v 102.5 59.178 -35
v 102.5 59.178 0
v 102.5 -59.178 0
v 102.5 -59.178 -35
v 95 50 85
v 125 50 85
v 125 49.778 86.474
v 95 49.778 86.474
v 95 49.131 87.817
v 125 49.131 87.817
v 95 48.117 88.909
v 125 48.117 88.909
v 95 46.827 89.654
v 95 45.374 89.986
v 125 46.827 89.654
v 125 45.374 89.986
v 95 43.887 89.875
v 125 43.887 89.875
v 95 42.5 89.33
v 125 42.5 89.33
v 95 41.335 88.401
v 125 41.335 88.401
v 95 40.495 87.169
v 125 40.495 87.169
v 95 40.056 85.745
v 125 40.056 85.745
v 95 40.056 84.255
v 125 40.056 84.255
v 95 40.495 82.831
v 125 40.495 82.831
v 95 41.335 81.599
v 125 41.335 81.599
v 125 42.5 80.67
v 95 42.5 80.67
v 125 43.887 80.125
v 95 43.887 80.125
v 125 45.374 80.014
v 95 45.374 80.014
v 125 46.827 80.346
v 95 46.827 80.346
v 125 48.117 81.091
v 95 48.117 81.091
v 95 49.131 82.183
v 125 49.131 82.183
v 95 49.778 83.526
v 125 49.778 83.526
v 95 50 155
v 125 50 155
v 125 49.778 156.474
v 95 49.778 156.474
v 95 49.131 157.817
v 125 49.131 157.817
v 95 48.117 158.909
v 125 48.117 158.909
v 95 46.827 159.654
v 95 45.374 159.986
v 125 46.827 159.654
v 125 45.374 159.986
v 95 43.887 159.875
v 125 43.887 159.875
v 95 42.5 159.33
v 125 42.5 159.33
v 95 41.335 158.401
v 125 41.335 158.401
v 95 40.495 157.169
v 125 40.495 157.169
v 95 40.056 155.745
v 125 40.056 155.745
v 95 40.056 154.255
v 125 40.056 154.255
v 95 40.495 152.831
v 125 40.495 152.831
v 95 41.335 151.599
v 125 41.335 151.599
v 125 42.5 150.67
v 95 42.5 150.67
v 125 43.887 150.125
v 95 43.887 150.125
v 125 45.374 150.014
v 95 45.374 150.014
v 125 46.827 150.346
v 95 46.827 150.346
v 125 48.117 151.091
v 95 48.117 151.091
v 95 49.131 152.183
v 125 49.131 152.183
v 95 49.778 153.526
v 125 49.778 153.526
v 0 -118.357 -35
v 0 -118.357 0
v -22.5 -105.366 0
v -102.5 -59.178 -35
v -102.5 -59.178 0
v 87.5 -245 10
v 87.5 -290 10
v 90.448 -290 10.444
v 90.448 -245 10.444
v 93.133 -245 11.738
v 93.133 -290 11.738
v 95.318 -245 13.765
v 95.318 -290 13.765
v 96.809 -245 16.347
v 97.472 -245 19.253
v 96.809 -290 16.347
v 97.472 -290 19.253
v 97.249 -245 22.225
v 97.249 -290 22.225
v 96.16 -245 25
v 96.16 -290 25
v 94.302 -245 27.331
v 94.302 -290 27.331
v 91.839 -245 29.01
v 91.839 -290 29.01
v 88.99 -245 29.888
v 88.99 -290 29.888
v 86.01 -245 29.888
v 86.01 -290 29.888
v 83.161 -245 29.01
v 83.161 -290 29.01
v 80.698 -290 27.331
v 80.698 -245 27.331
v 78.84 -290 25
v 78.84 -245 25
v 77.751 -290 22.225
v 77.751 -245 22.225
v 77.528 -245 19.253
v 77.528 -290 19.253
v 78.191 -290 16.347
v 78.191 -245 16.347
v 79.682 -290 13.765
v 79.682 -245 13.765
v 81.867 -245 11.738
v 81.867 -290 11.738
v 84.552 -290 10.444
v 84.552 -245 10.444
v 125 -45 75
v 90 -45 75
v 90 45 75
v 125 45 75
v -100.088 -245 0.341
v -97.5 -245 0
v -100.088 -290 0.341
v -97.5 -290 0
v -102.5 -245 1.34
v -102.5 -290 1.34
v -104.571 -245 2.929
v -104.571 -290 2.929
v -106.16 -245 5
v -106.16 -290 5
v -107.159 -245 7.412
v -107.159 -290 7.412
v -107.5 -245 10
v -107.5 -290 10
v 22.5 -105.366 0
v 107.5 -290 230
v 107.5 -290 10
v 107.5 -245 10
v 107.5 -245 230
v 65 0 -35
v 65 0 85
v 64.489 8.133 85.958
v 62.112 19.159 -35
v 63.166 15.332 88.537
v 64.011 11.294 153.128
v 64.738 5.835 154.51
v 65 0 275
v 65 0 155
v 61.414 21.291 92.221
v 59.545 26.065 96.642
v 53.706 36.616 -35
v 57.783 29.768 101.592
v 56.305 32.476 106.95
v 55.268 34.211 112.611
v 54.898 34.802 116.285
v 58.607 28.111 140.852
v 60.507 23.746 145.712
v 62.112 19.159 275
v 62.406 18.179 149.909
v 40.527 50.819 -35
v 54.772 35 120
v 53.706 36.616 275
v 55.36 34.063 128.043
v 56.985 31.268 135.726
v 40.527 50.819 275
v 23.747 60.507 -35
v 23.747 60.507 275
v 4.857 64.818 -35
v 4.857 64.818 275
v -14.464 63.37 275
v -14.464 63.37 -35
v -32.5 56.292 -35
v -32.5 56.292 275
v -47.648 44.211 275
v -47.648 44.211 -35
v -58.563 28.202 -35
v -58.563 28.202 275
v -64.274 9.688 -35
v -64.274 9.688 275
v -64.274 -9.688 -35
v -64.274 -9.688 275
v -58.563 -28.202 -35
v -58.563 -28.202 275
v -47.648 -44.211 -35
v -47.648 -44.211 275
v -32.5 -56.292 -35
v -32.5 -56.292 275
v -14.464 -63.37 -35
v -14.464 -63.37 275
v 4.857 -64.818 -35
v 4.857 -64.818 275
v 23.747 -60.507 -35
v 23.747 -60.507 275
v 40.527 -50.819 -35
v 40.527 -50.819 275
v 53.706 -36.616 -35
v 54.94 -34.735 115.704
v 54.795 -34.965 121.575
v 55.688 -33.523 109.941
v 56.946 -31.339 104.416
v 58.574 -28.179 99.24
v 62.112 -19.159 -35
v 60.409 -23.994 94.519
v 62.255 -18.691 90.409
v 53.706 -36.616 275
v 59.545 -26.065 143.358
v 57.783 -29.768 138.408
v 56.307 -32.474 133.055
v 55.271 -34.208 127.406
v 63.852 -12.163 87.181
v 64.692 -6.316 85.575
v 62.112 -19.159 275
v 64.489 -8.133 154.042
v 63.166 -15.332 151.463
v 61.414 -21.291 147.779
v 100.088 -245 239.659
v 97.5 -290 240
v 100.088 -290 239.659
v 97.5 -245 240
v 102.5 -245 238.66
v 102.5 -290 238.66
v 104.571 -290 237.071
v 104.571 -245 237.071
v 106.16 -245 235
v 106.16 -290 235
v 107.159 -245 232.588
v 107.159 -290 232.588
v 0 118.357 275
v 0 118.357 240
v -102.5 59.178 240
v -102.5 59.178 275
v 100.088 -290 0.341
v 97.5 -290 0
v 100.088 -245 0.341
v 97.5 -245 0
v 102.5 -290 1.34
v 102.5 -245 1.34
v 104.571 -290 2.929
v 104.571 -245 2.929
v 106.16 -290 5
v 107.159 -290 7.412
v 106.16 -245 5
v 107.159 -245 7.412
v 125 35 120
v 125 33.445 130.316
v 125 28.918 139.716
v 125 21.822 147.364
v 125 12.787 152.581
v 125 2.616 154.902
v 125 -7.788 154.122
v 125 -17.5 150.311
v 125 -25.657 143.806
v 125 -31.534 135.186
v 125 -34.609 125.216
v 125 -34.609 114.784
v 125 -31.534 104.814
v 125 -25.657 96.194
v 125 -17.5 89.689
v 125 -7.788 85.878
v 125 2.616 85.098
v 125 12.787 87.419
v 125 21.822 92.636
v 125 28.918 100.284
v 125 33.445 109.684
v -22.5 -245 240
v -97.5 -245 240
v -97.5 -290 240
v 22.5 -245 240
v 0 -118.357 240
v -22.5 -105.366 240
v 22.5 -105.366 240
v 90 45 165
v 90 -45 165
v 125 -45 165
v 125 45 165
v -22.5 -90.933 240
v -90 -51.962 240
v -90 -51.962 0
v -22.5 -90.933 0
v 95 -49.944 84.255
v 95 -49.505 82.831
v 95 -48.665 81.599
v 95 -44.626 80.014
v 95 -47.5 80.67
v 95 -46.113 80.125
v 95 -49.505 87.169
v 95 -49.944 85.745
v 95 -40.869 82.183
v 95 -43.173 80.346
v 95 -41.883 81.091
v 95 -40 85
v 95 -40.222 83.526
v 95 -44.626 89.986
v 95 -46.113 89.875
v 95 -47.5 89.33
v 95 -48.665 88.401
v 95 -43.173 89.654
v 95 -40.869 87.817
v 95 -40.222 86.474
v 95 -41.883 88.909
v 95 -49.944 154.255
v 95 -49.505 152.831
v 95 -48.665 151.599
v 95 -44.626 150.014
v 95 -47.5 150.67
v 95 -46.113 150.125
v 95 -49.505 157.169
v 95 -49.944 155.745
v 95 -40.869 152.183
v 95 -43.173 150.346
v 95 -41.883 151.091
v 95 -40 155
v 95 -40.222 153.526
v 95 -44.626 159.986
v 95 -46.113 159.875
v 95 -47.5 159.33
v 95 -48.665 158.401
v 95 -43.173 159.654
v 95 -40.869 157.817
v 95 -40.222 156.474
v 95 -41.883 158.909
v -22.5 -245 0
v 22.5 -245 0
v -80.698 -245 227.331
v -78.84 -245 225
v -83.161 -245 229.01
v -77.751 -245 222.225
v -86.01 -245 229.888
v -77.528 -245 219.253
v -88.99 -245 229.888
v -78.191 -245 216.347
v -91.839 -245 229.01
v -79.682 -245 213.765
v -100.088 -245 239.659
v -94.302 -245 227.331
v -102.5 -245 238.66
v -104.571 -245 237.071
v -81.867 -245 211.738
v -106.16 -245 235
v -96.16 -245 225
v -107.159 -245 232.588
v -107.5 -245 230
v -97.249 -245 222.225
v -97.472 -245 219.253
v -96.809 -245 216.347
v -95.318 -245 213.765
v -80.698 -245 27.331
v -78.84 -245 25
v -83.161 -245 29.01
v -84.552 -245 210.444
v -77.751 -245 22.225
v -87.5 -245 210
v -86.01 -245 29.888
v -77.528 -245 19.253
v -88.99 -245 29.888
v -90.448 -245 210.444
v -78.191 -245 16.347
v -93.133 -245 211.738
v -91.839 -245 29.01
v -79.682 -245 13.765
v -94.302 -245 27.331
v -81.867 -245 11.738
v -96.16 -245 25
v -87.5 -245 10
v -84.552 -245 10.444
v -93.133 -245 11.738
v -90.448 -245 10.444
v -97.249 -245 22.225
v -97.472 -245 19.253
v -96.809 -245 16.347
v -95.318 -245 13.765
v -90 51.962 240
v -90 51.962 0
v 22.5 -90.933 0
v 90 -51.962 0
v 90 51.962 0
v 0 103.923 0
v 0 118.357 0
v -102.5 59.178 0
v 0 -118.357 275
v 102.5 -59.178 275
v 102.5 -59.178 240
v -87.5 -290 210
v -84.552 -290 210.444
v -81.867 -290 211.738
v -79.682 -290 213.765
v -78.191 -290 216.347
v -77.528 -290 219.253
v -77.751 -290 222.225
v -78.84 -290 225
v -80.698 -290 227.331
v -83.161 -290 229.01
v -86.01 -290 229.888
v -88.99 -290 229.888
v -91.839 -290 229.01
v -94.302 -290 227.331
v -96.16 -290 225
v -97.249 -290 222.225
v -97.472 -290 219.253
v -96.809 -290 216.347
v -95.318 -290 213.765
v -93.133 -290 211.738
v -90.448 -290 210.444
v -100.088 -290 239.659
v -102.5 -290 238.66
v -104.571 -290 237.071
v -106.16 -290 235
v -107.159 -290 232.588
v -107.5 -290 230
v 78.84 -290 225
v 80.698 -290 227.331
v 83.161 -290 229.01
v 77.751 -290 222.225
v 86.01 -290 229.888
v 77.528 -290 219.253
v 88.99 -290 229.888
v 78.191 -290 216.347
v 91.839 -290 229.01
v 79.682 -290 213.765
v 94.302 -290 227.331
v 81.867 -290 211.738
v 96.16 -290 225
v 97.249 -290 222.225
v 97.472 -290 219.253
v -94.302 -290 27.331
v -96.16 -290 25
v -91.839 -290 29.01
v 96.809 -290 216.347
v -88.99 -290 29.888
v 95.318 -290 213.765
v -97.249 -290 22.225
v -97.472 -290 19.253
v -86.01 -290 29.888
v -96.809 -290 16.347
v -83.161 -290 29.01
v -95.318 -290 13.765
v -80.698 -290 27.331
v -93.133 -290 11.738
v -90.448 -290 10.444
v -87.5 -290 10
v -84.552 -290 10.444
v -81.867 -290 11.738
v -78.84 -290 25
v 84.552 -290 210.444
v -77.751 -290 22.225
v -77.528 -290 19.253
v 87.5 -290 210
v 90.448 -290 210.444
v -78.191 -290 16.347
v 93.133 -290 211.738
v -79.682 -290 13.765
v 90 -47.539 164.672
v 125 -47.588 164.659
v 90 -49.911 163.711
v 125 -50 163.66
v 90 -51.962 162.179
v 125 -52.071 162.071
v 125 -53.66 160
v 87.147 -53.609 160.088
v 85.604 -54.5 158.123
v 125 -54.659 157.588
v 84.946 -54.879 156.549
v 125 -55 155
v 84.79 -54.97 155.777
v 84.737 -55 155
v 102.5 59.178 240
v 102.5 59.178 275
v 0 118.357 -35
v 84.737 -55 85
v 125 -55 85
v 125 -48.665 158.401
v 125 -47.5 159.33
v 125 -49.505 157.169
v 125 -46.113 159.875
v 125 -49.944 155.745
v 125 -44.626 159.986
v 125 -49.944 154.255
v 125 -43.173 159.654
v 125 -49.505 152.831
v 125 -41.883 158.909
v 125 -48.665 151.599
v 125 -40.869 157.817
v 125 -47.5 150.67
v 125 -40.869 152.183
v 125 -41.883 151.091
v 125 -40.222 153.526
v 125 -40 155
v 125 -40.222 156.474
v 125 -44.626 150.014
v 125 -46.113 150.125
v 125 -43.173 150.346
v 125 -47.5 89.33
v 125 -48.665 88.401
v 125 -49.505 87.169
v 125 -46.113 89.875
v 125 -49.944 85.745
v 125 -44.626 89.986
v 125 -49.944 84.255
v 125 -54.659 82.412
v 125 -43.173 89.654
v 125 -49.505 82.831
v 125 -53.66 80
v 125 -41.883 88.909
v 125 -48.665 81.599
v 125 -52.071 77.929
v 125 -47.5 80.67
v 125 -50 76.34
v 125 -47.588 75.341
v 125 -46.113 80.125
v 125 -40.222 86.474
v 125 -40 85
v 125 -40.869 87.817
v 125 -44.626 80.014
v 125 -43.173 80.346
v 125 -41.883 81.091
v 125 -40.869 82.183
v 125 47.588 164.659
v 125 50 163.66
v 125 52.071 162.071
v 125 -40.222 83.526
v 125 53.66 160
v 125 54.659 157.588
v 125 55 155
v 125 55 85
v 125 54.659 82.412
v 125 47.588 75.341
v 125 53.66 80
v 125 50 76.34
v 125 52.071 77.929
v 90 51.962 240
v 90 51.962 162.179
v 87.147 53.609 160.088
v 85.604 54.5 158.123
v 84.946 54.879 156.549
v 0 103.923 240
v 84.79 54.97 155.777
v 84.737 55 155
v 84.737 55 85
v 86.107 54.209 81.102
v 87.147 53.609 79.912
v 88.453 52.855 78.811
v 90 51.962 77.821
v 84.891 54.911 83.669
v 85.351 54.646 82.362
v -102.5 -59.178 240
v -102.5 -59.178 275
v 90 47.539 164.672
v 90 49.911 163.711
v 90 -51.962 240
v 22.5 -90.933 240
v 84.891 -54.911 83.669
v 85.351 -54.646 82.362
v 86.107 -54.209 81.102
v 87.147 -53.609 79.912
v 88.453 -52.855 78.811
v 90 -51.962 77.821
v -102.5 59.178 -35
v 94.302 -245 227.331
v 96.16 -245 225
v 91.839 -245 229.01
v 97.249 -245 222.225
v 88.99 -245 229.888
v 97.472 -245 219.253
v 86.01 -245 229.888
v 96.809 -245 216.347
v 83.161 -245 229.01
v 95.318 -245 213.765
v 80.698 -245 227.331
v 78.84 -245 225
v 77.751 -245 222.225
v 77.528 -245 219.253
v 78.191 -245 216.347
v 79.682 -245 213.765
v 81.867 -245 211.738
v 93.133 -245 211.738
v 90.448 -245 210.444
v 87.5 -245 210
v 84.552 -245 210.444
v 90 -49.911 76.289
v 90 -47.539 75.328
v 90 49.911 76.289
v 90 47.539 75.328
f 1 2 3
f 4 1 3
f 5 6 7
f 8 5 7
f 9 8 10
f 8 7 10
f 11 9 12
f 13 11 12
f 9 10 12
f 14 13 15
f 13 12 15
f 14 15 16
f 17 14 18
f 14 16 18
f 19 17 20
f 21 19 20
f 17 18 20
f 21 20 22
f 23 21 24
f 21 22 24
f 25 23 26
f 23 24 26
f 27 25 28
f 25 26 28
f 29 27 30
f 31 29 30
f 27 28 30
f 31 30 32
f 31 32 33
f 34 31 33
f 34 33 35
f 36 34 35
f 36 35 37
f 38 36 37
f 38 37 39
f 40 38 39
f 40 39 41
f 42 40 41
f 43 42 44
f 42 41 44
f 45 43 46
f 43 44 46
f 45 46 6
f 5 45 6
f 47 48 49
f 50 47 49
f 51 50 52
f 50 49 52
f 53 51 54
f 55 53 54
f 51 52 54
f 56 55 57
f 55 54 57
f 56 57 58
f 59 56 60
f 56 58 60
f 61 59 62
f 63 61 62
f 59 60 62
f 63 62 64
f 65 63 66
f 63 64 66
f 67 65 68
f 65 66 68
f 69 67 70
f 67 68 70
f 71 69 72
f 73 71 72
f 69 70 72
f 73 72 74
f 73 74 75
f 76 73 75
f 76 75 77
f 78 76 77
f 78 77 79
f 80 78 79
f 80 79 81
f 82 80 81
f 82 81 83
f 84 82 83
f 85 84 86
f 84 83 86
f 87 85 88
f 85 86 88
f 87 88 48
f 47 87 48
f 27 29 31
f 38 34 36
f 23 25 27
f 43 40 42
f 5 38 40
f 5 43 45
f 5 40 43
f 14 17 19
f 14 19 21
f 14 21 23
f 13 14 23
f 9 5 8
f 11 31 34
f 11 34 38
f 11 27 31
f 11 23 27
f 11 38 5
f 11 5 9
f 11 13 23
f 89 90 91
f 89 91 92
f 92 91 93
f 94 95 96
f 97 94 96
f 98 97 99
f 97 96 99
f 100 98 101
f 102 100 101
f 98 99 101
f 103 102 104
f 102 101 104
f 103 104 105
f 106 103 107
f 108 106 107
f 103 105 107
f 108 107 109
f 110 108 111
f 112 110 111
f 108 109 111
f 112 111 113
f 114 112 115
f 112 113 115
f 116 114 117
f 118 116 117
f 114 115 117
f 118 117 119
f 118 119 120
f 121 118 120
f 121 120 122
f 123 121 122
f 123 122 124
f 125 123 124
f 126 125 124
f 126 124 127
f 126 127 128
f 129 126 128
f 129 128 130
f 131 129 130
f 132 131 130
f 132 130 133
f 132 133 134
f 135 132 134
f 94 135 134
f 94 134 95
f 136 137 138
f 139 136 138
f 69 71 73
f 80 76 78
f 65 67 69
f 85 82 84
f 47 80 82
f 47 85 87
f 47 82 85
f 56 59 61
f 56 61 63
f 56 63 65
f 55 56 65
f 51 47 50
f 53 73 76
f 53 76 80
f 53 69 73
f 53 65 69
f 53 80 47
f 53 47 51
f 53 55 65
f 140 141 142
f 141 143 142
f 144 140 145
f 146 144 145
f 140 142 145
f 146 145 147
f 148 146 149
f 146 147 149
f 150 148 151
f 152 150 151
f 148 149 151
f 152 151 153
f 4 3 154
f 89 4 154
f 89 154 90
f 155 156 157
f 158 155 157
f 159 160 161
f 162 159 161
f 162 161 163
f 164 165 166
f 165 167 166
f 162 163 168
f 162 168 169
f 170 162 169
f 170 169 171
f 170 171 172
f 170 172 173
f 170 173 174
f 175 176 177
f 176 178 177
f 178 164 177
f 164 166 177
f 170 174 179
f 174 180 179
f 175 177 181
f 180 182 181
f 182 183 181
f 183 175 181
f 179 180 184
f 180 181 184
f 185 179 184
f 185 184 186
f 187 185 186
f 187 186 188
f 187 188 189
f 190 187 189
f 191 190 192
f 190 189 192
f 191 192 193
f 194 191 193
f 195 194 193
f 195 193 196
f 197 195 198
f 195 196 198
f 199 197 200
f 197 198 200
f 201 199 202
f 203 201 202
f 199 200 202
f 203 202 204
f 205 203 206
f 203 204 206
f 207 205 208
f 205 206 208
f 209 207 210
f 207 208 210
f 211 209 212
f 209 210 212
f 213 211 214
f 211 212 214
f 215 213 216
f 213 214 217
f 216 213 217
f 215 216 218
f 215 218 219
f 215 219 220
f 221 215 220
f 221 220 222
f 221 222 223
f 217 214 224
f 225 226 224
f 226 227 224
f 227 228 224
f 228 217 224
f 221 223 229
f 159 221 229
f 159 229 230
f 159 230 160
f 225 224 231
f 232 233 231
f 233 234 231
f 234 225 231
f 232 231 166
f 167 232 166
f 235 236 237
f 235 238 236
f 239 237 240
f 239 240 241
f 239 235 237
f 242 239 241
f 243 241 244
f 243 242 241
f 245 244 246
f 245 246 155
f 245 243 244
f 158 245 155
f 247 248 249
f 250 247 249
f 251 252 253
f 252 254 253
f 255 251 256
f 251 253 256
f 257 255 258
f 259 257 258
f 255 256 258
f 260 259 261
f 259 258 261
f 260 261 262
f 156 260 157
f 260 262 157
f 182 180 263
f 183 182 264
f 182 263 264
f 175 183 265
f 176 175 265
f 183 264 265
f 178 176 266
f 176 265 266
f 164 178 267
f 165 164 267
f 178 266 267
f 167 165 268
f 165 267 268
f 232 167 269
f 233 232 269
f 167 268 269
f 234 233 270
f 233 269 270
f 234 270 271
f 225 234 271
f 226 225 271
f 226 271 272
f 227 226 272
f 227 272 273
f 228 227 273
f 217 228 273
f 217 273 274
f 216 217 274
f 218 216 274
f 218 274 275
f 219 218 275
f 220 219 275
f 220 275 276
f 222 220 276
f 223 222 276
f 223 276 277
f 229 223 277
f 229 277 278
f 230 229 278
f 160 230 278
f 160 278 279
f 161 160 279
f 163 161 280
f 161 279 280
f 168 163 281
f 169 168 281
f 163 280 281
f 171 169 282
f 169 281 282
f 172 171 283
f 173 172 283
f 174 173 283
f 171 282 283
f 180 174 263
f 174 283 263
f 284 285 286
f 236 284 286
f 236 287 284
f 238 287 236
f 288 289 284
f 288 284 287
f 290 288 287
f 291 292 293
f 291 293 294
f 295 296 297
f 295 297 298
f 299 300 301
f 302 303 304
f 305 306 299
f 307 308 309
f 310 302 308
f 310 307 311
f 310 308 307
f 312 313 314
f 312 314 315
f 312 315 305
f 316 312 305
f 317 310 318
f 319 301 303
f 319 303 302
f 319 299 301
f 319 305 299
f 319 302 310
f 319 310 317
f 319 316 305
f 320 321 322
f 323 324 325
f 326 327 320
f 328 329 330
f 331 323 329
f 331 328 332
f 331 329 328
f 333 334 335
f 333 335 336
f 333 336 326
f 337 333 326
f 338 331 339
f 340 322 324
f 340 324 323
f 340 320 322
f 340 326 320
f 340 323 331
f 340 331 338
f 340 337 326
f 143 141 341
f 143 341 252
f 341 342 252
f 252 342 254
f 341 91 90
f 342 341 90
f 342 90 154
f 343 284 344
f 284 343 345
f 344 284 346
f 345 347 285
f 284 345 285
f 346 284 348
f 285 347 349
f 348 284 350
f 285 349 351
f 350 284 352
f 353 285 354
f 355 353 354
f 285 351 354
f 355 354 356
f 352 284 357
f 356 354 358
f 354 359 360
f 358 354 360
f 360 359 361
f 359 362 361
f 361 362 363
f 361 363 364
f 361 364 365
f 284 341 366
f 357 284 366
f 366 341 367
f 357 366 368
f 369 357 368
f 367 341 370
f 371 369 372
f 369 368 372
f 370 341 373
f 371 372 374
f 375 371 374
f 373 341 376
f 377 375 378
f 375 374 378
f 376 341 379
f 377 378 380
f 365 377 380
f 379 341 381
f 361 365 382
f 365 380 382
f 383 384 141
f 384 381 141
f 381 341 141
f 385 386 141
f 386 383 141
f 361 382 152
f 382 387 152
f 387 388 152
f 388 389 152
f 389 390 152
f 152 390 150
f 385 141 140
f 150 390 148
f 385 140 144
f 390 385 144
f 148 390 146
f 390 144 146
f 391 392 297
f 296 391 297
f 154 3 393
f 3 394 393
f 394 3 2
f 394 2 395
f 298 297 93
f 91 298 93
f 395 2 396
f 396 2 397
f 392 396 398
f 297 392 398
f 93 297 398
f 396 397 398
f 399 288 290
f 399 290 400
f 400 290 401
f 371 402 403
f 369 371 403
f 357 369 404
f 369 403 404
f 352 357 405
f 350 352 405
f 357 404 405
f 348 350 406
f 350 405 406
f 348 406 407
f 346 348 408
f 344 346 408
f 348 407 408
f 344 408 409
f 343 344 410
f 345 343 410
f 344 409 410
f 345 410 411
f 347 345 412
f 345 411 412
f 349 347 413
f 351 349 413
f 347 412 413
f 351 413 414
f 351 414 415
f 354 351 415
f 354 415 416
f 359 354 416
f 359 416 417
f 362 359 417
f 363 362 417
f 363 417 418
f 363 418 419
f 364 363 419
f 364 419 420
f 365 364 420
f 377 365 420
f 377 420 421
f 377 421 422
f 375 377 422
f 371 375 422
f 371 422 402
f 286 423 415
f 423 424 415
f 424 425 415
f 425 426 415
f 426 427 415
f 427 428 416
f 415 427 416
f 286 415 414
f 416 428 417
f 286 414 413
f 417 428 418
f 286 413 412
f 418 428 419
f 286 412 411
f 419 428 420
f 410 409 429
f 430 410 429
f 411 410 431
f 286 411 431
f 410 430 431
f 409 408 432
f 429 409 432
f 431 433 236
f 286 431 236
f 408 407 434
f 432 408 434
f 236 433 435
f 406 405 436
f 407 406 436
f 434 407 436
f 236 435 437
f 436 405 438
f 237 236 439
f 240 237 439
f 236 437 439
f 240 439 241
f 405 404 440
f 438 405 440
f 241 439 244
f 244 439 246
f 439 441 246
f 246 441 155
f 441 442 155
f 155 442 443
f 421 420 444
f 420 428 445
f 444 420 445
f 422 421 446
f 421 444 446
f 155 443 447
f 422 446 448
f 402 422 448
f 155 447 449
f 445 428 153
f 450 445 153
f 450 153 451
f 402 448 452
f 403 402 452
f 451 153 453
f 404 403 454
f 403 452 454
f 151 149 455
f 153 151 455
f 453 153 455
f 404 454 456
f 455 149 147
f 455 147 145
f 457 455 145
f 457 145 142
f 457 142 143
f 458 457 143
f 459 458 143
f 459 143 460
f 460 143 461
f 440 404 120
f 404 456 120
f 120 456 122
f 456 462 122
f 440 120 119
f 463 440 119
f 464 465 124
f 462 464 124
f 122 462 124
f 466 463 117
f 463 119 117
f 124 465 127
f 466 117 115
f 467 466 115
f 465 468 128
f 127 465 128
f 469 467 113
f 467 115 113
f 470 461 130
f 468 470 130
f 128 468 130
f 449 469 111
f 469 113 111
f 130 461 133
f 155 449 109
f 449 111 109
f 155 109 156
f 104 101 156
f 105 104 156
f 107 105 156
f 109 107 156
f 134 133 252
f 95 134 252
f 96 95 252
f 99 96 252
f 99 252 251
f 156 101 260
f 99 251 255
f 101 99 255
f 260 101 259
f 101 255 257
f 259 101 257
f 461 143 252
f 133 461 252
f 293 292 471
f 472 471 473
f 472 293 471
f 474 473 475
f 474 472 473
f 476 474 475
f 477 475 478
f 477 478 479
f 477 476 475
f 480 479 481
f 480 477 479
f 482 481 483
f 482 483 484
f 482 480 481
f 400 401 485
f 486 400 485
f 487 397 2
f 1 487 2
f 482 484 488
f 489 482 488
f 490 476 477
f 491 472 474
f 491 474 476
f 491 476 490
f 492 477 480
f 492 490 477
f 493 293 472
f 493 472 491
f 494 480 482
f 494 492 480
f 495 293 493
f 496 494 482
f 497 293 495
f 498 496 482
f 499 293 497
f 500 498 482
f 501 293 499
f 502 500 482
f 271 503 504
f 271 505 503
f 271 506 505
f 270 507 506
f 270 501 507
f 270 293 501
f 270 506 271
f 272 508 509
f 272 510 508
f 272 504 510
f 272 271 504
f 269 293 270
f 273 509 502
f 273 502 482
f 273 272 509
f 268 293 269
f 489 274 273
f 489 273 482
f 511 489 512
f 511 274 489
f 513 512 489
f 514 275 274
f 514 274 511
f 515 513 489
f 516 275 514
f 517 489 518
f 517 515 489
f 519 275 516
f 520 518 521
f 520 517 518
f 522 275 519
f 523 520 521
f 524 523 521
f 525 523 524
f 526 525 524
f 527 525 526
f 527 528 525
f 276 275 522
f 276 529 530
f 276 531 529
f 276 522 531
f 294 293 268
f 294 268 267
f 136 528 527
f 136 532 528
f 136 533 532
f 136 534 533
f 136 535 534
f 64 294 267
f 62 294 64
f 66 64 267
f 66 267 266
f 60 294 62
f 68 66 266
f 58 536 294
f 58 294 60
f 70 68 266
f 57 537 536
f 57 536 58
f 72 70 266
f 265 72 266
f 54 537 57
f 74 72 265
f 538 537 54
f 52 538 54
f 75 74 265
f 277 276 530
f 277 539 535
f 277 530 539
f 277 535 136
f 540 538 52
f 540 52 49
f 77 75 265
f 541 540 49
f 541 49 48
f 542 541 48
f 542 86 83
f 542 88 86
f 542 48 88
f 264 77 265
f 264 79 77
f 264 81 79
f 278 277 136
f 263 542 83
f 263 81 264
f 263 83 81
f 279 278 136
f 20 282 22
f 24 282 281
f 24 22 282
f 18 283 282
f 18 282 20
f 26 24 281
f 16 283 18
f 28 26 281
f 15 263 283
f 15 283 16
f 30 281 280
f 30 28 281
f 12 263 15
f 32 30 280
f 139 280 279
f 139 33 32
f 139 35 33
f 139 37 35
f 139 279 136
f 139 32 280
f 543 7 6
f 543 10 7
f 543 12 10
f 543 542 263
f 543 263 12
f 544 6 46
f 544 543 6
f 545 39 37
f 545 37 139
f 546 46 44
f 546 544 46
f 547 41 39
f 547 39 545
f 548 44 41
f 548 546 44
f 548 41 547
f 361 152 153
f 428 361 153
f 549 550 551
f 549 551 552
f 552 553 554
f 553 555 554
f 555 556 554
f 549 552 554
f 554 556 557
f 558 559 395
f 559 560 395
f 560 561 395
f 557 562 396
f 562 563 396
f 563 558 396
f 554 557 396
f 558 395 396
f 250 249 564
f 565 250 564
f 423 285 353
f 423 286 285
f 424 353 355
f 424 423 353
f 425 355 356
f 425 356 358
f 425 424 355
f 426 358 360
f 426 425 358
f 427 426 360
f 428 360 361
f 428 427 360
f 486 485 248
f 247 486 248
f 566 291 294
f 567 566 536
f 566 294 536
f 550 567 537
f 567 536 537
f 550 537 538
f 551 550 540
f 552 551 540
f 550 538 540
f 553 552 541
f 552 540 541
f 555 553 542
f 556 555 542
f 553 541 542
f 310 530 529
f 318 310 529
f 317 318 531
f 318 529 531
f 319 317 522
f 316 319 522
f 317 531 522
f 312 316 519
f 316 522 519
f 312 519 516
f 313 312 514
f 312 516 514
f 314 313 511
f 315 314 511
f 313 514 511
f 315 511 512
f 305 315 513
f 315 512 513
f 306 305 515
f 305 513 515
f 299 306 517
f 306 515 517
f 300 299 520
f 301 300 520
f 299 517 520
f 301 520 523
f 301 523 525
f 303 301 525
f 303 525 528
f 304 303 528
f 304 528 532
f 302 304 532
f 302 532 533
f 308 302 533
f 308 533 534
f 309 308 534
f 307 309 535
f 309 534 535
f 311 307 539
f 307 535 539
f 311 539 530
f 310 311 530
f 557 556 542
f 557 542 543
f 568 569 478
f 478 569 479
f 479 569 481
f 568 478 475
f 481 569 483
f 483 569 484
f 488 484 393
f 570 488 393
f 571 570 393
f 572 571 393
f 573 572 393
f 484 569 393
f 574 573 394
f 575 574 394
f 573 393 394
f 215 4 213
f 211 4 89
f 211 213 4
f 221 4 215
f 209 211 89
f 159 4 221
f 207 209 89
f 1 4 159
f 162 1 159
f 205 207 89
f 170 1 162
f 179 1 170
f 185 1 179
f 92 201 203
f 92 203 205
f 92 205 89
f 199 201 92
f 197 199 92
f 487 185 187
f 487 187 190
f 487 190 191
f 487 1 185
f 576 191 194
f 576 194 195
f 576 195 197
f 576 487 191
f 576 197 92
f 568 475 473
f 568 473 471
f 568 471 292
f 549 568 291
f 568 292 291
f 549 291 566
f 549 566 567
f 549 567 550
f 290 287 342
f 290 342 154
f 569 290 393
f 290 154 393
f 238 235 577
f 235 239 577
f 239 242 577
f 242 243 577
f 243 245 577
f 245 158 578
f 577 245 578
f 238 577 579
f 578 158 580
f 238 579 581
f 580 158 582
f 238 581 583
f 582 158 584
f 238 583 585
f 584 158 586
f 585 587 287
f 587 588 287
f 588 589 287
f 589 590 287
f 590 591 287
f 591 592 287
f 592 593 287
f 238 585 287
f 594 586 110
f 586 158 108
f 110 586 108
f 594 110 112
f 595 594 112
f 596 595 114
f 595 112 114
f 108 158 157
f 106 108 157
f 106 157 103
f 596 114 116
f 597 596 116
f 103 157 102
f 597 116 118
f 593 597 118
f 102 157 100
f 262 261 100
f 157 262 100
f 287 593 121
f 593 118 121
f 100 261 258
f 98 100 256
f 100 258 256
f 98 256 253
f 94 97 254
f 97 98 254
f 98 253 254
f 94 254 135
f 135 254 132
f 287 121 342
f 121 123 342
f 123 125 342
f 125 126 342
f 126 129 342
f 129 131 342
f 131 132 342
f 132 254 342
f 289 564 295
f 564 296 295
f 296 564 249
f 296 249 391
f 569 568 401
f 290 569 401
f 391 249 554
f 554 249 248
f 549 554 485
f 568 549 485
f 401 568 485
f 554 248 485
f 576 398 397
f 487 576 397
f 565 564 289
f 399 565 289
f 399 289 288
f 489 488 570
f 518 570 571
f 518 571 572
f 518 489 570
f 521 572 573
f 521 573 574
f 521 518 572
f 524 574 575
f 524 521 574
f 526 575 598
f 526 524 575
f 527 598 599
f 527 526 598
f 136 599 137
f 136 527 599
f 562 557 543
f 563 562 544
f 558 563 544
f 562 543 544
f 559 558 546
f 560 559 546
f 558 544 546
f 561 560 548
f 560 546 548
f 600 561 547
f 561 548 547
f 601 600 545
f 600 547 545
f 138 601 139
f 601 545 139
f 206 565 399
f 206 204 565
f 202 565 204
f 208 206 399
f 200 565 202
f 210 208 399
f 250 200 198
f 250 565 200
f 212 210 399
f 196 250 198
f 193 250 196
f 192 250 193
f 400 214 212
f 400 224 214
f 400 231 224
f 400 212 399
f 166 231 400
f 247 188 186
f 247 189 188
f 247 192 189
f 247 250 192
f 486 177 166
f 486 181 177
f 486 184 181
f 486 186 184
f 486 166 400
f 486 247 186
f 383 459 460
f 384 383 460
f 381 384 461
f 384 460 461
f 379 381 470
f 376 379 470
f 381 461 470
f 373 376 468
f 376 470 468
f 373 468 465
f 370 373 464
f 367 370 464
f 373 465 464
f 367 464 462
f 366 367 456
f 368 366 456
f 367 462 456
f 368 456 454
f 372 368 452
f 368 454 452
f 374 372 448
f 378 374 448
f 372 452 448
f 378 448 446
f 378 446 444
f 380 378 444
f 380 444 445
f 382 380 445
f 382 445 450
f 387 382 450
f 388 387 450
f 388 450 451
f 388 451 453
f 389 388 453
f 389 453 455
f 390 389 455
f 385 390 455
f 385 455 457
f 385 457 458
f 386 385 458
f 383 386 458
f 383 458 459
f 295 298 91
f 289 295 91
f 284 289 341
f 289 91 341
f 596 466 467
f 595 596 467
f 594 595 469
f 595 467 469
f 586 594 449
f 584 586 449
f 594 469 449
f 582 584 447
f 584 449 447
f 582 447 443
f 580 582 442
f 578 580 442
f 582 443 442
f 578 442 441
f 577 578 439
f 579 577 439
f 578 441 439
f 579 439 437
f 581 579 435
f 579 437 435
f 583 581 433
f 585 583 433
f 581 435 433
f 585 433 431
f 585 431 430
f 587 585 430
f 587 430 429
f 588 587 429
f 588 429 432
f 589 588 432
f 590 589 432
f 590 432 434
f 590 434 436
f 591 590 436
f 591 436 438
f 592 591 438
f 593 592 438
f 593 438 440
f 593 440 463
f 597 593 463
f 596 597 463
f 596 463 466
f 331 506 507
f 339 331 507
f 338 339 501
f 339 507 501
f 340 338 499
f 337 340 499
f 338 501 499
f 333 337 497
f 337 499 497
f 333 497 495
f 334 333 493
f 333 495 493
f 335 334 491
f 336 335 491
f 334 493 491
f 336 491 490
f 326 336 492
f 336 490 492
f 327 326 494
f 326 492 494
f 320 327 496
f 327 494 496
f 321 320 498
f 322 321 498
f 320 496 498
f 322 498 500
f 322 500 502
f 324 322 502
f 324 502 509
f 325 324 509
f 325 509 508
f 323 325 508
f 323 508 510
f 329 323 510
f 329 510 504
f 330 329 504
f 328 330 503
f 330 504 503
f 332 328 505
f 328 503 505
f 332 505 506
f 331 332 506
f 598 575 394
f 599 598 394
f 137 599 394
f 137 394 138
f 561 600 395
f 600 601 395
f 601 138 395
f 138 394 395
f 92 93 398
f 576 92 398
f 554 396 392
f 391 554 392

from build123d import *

# Parameters (mm, degrees)
EXTRUDE_1_DEPTH          = 240
EXTRUDE_2_DEPTH          = 35
EXTRUDE_4_DEPTH          = 35
EXTRUDE_5_DEPTH          = 35
EXTRUDE_5_DEPTH_BACK     = 90
SKETCH_5_W               = 90
SKETCH_5_H               = 110
SKETCH_6_R               = 65
CUT_EXTRUDE_1_DEPTH      = 443.521185934
CUT_EXTRUDE_2_REACH      = 464.365
CUT_EXTRUDE_2_END_RADIUS = 65
SKETCH_8_R               = 35
CUT_EXTRUDE_3_REACH      = 509.942
SKETCH_9_R               = 10
SKETCH_10_R              = 5
CUT_EXTRUDE_4_DEPTH      = 30
FILLET_1_R               = 10
FILLET_2_R               = 10


with BuildPart() as part:
    # Эскиз1 → Бобышка-Вытянуть1 (new body)
    with BuildSketch(Plane.XY):
        Polygon((0, 103.923048454), (-90, 51.961524227), (-90, -51.961524227), (-22.5, -90.932667397), (-22.5, -245), (-107.5, -245), (-107.5, -290), (107.5, -290), (107.5, -245), (22.5, -245), (22.5, -90.932667397), (90, -51.961524227), (90, 51.961524227), align=None)
    extrude(amount=EXTRUDE_1_DEPTH)

    # Эскиз2 → Бобышка-Вытянуть2 (add)
    with BuildSketch(Plane.XY.offset(240)):
        Polygon((0, 118.356805184), (-102.5, 59.178402592), (-102.5, -59.178402592), (0, -118.356805184), (102.5, -59.178402592), (102.5, 59.178402592), align=None)
    extrude(amount=EXTRUDE_2_DEPTH)

    # Эскиз4 → Бобышка-Вытянуть4 (add)
    with BuildSketch(Plane(origin=(0, 0, 0), x_dir=(-1, 0, 0), z_dir=(0, 0, -1))):
        Polygon((0, 118.356805184), (-102.5, 59.178402592), (-102.5, -59.178402592), (0, -118.356805184), (102.5, -59.178402592), (102.5, 59.178402592), align=None)
    extrude(amount=EXTRUDE_4_DEPTH)

    # Эскиз5 → Бобышка-Вытянуть5 (add, two sides: drawn at the far end of the back side and taken through both)
    with BuildSketch(Plane(origin=(90, 0, 0), x_dir=(0, 0, -1), z_dir=(1, 0, 0)).offset(-EXTRUDE_5_DEPTH_BACK)):
        with Locations((-120, 0)):
            Rectangle(SKETCH_5_W, SKETCH_5_H)
    extrude(amount=EXTRUDE_5_DEPTH + EXTRUDE_5_DEPTH_BACK)

    # Эскиз6 → Вырез-Вытянуть1 (cut, through all)
    with BuildSketch(Plane.XY.offset(275)):
        Circle(SKETCH_6_R)
    extrude(amount=-CUT_EXTRUDE_1_DEPTH, mode=Mode.SUBTRACT)

    # Вырез-Вытянуть2: up to this cylinder (the profile starts outside it)
    cut_extrude_2_end = Plane(origin=(0, 0, 120), z_dir=(0, 0, 1)) * Cylinder(CUT_EXTRUDE_2_END_RADIUS, 1059.73, mode=Mode.PRIVATE)
    # Эскиз8 → Вырез-Вытянуть2 (cut, up to the surface)
    with BuildSketch(Plane(origin=(125, 0, 0), x_dir=(0, 0, -1), z_dir=(1, 0, 0)), mode=Mode.PRIVATE) as cut_extrude_2_sk1:
        with Locations(Location((-120, 0, 0), (0, 0, 90))):
            Circle(SKETCH_8_R)
    cut_extrude_2_tool1 = extrude(cut_extrude_2_sk1.sketch, amount=-CUT_EXTRUDE_2_REACH, mode=Mode.PRIVATE) - cut_extrude_2_end
    add(cut_extrude_2_tool1.solids().sort_by_distance((125, 0, 120))[0], mode=Mode.SUBTRACT)

    # Эскиз9 → Вырез-Вытянуть3 (cut, up to next)
    with BuildSketch(Plane.XZ.offset(290), mode=Mode.PRIVATE) as cut_extrude_3_sk1:
        with Locations(Location((87.5, 220, 0), (0, 0, 270))):
            Circle(SKETCH_9_R)
    cut_extrude_3_tool1 = extrude(cut_extrude_3_sk1.sketch, amount=-CUT_EXTRUDE_3_REACH, mode=Mode.PRIVATE) & part.part
    # Эскиз9 → Вырез-Вытянуть3 (cut, up to next)
    with BuildSketch(Plane.XZ.offset(290), mode=Mode.PRIVATE) as cut_extrude_3_sk2:
        with Locations(Location((-87.5, 220, 0), (0, 0, 270))):
            Circle(SKETCH_9_R)
    cut_extrude_3_tool2 = extrude(cut_extrude_3_sk2.sketch, amount=-CUT_EXTRUDE_3_REACH, mode=Mode.PRIVATE) & part.part
    # Эскиз9 → Вырез-Вытянуть3 (cut, up to next)
    with BuildSketch(Plane.XZ.offset(290), mode=Mode.PRIVATE) as cut_extrude_3_sk3:
        with Locations(Location((87.5, 20, 0), (0, 0, 270))):
            Circle(SKETCH_9_R)
    cut_extrude_3_tool3 = extrude(cut_extrude_3_sk3.sketch, amount=-CUT_EXTRUDE_3_REACH, mode=Mode.PRIVATE) & part.part
    # Эскиз9 → Вырез-Вытянуть3 (cut, up to next)
    with BuildSketch(Plane.XZ.offset(290), mode=Mode.PRIVATE) as cut_extrude_3_sk4:
        with Locations(Location((-87.5, 20, 0), (0, 0, 270))):
            Circle(SKETCH_9_R)
    cut_extrude_3_tool4 = extrude(cut_extrude_3_sk4.sketch, amount=-CUT_EXTRUDE_3_REACH, mode=Mode.PRIVATE) & part.part
    add(cut_extrude_3_tool1.solids().sort_by_distance((87.5, -290, 220))[0], mode=Mode.SUBTRACT)
    add(cut_extrude_3_tool2.solids().sort_by_distance((-87.5, -290, 220))[0], mode=Mode.SUBTRACT)
    add(cut_extrude_3_tool3.solids().sort_by_distance((87.5, -290, 20))[0], mode=Mode.SUBTRACT)
    add(cut_extrude_3_tool4.solids().sort_by_distance((-87.5, -290, 20))[0], mode=Mode.SUBTRACT)

    # Эскиз10 → Вырез-Вытянуть4 (cut)
    with BuildSketch(Plane(origin=(125, 0, 0), x_dir=(0, 0, -1), z_dir=(1, 0, 0))):
        with Locations(Location((-155, -45, 0), (0, 0, 90))):
            Circle(SKETCH_10_R)
        with Locations(Location((-155, 45, 0), (0, 0, 90))):
            Circle(SKETCH_10_R)
        with Locations(Location((-85, 45, 0), (0, 0, 90))):
            Circle(SKETCH_10_R)
        with Locations(Location((-85, -45, 0), (0, 0, 90))):
            Circle(SKETCH_10_R)
    extrude(amount=-CUT_EXTRUDE_4_DEPTH, mode=Mode.SUBTRACT)

    # Скругление1
    fillet_1_edges = [part.edges().sort_by_distance(p)[0] for p in [
        (104.868602792, -55, 165),
        (104.868602792, -55, 75),
        (104.868602792, 55, 75),
        (104.868602792, 55, 165),
    ]]
    fillet(fillet_1_edges, radius=FILLET_1_R)

    # Скругление2
    fillet_2_edges = [part.edges().sort_by_distance(p)[0] for p in [
        (107.5, -267.5, 0),
        (-107.5, -267.5, 0),
        (-107.5, -267.5, 240),
        (107.5, -267.5, 240),
    ]]
    fillet(fillet_2_edges, radius=FILLET_2_R)


solid = part.part
